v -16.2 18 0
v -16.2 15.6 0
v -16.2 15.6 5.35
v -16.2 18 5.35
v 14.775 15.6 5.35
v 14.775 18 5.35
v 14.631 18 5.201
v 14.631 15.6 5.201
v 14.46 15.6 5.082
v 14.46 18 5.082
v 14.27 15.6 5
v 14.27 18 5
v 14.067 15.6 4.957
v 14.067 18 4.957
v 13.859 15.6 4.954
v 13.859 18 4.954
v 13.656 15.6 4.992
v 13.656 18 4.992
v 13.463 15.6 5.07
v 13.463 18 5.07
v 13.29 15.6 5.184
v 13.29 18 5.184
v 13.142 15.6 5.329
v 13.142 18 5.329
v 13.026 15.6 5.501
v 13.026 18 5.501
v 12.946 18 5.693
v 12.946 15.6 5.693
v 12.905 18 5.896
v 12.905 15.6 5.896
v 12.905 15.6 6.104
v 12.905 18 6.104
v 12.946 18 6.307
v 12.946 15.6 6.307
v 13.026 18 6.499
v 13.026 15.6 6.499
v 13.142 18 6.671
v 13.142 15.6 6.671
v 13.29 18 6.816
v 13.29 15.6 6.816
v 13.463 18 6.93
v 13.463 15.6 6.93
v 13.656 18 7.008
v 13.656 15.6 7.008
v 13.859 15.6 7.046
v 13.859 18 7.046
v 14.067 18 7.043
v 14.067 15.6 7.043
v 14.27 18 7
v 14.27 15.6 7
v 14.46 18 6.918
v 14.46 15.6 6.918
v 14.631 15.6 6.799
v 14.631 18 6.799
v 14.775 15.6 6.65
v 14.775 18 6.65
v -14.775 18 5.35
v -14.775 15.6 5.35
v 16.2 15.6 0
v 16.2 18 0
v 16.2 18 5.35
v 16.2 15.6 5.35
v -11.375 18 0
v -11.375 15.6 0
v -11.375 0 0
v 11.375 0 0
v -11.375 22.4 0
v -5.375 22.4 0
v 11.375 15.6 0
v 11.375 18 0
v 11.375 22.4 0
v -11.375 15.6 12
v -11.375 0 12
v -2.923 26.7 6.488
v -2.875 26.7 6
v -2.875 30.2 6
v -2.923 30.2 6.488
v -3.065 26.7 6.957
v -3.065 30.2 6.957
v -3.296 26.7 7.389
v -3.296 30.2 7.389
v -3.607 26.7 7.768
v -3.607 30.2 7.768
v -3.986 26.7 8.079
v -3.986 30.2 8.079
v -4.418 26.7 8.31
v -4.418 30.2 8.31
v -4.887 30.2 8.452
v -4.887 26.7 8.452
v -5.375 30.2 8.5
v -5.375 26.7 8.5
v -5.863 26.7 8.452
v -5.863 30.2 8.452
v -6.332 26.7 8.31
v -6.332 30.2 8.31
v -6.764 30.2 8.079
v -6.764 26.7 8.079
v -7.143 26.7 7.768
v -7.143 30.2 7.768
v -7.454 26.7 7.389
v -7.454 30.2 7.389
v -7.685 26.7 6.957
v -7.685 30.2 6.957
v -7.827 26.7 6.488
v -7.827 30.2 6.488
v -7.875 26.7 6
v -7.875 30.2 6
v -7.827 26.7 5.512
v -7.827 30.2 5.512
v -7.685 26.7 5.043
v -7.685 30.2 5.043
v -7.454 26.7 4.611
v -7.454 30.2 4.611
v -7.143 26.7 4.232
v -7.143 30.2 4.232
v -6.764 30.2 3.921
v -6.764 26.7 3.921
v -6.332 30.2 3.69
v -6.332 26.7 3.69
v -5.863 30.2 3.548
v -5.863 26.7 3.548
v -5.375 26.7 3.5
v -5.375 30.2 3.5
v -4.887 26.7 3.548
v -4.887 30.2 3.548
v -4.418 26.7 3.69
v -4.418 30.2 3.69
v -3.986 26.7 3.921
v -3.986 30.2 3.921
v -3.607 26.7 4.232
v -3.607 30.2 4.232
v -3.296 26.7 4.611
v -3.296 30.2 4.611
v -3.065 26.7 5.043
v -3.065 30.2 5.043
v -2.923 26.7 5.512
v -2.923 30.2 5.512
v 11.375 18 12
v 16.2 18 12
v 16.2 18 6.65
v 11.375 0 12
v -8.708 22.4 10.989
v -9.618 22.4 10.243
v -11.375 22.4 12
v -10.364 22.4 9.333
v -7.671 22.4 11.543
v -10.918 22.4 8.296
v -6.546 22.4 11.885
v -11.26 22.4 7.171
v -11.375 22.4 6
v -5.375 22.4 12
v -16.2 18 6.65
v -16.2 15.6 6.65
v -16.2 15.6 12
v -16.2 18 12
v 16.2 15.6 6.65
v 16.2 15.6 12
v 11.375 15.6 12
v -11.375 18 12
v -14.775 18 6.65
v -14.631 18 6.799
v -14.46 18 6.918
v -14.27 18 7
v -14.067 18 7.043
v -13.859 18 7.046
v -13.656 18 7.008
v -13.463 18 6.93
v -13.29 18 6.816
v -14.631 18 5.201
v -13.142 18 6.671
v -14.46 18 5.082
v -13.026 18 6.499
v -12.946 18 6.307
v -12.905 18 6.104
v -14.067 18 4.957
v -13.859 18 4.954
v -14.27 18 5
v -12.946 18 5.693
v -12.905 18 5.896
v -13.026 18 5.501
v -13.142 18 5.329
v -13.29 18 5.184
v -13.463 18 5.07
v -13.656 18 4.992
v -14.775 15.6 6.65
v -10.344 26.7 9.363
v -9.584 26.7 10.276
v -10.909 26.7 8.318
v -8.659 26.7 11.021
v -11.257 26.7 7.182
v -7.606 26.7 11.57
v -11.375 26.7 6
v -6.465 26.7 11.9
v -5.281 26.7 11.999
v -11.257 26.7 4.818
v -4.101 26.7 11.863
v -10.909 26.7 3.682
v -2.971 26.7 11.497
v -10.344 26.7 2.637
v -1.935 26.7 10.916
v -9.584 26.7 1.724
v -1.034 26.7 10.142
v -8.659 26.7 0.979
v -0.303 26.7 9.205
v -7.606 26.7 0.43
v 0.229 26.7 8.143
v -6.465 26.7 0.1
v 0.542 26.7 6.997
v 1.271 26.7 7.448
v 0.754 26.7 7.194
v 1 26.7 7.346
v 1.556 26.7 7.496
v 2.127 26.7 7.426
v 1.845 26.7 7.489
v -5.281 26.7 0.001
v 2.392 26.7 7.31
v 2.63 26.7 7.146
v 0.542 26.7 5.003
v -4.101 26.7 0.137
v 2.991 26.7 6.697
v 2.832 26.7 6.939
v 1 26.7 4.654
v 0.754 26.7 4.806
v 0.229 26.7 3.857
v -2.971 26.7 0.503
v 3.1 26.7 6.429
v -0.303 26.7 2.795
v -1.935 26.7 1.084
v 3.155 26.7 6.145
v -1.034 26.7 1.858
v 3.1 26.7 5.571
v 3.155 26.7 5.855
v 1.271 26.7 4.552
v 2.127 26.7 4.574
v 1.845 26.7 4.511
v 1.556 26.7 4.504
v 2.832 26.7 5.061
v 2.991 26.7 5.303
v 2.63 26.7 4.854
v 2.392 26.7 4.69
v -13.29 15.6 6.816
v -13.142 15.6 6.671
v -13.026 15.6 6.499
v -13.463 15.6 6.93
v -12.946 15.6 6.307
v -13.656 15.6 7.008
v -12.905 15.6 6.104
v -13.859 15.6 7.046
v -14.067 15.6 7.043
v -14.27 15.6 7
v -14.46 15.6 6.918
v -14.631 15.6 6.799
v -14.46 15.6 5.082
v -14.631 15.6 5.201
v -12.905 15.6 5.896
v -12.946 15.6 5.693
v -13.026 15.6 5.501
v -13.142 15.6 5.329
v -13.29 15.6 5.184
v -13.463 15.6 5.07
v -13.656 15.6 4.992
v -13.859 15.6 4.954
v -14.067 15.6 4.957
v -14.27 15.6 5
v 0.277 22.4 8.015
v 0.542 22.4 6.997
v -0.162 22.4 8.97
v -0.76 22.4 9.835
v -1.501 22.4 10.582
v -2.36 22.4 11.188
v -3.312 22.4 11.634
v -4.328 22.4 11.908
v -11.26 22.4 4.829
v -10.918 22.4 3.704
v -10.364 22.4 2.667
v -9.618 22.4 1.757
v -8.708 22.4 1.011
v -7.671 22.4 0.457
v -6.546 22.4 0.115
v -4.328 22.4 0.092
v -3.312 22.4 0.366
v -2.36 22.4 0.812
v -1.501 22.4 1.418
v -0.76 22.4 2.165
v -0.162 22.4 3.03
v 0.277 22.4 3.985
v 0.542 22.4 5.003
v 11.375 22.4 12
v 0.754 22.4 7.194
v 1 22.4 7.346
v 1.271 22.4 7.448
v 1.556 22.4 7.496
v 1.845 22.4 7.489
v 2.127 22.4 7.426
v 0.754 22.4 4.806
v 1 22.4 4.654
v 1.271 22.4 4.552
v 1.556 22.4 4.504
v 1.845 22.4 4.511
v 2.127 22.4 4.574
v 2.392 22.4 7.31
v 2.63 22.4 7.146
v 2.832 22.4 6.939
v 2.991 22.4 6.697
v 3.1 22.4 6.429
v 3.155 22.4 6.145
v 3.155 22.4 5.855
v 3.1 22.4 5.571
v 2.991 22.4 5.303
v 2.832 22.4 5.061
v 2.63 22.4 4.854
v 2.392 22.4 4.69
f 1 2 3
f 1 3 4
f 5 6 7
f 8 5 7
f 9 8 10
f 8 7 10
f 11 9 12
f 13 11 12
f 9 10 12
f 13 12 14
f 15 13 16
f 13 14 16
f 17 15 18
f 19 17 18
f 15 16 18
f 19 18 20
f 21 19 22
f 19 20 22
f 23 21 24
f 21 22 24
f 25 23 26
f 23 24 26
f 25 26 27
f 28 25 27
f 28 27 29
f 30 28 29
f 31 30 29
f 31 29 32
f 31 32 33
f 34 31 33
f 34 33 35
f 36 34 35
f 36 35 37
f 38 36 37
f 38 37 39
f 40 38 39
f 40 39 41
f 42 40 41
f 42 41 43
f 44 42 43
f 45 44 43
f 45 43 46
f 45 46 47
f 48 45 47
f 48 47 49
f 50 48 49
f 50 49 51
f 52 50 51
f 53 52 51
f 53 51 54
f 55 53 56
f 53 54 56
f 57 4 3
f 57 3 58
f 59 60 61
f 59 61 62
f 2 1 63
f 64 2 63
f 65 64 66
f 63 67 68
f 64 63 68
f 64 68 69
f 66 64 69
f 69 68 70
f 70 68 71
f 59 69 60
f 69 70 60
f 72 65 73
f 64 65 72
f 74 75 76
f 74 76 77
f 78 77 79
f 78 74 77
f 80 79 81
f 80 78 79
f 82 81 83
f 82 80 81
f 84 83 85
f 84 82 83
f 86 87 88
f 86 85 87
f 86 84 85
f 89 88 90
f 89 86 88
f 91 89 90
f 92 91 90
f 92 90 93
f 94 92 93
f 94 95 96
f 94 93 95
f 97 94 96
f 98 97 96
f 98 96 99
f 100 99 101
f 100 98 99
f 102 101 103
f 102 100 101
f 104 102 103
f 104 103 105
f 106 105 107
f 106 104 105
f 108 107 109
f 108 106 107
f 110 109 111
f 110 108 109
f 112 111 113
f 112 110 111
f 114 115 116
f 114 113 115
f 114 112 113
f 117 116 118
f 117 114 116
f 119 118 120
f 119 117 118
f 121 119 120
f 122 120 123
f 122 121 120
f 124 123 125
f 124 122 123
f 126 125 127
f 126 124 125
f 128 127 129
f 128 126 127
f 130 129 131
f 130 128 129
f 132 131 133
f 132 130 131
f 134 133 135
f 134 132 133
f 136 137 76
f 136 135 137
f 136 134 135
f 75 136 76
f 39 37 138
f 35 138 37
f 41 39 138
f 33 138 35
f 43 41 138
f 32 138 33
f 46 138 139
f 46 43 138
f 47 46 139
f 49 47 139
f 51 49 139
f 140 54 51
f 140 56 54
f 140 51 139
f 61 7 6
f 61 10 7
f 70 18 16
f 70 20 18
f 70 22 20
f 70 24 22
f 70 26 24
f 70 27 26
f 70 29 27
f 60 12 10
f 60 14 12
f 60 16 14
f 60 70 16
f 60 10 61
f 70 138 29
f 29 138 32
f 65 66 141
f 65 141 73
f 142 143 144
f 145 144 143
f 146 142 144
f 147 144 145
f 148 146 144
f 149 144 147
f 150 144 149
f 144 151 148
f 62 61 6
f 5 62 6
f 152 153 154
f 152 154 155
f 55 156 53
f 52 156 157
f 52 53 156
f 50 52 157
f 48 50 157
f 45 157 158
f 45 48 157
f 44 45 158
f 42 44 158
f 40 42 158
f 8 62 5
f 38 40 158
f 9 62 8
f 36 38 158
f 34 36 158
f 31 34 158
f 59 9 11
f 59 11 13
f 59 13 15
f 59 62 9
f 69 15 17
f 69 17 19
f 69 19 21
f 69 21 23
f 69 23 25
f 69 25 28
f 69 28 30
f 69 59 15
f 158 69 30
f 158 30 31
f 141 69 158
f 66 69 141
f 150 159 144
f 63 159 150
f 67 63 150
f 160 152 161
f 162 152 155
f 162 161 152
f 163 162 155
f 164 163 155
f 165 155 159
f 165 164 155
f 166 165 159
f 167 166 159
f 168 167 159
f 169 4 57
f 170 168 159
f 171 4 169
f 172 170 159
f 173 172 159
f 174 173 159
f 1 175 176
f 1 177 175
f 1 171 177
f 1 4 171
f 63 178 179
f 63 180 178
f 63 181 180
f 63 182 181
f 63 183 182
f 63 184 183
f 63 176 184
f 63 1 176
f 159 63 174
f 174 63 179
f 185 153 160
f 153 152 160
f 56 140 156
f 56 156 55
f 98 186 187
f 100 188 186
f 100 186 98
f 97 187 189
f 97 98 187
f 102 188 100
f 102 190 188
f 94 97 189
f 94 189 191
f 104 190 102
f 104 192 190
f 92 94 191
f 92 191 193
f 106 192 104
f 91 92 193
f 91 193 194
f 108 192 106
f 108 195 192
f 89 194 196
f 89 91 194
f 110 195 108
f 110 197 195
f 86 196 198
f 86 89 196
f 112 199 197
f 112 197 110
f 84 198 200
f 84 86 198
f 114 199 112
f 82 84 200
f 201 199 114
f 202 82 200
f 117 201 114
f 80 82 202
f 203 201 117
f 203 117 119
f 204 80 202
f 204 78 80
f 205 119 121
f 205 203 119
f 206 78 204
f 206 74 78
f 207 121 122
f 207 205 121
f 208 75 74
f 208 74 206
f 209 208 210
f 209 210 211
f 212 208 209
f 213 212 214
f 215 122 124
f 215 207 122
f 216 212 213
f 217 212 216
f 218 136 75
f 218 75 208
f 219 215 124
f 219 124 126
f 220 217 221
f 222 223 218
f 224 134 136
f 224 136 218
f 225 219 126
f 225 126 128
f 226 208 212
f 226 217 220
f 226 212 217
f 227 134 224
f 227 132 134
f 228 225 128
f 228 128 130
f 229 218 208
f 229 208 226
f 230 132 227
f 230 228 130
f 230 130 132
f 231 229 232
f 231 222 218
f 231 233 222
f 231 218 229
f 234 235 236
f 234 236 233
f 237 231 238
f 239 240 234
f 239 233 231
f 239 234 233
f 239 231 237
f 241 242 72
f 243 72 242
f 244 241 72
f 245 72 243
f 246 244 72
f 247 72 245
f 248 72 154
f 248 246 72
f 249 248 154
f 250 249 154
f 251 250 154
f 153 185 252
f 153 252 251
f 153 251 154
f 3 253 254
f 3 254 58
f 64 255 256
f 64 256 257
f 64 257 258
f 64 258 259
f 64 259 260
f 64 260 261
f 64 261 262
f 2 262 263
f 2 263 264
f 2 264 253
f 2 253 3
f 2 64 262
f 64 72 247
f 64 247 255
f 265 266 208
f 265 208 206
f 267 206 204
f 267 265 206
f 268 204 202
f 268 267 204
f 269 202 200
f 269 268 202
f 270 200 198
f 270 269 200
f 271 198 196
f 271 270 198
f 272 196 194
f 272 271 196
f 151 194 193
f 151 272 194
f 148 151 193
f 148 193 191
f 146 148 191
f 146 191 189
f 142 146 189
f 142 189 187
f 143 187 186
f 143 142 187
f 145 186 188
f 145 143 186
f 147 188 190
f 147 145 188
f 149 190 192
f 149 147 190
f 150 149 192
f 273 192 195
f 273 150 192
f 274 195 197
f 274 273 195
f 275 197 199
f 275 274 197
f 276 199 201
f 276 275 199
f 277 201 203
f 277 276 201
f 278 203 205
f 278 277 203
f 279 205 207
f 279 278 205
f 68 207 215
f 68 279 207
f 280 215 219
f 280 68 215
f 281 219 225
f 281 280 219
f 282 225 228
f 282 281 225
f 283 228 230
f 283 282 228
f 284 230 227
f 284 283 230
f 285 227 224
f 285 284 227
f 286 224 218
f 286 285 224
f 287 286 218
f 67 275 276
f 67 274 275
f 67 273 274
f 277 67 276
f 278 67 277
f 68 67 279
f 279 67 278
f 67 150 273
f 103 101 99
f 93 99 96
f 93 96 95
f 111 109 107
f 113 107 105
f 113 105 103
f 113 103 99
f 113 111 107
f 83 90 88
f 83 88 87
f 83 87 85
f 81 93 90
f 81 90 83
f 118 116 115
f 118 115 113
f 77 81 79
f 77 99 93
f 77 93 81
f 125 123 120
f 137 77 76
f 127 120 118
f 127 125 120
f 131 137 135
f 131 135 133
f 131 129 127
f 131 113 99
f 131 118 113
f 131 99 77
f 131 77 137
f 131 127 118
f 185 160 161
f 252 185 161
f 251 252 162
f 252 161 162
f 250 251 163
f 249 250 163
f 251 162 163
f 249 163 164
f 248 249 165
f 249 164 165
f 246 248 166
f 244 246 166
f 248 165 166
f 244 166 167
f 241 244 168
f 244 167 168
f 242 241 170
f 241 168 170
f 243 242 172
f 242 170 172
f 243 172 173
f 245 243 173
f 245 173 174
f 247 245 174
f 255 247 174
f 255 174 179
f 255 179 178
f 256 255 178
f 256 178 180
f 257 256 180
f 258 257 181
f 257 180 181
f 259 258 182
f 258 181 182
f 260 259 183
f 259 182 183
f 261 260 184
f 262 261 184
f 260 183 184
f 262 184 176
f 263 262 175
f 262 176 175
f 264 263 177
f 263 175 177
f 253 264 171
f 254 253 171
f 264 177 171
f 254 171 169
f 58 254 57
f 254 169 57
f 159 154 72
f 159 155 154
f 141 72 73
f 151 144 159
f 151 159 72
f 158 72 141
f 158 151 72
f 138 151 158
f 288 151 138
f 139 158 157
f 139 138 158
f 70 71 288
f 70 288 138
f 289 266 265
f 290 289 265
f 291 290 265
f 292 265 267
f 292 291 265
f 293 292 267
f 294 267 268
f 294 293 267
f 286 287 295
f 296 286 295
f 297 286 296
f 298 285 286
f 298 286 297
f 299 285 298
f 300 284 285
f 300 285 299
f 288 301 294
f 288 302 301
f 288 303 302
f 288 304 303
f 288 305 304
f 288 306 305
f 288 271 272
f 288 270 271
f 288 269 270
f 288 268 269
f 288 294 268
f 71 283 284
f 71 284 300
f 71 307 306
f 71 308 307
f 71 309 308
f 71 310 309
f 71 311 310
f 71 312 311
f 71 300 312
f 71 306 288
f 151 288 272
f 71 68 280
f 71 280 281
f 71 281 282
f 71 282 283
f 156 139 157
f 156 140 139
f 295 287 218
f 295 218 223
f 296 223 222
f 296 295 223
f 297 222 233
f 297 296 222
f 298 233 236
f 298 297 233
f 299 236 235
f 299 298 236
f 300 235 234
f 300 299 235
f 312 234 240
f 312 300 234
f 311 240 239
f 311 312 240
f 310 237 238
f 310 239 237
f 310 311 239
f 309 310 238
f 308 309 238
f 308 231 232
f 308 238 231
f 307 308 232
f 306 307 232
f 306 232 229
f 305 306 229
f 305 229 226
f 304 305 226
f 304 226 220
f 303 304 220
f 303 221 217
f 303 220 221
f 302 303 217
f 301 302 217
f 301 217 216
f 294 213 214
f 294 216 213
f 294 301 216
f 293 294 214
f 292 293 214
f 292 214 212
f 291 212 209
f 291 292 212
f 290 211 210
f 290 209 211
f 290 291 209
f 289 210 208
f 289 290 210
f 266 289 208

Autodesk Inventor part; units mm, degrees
ref_plane "YZ Plane" through (0, 0, 0) normal (1, 0, 0) x (0, 1, 0)
ref_plane "XZ Plane" through (0, 0, 0) normal (0, 1, 0) x (-1, 0, 0)
ref_plane "XY Plane" through (0, 0, 0) normal (0, 0, 1) x (1, 0, 0)
sketch "Sketch1" plane through (0, 0, 0) normal (0, 0, 1) x (1, 0, 0)
  line L0 (0, 0) -> (-11.375, 0)
  line L1 (-11.375, 0) -> (-11.375, 15.6)
  line L2 (-11.375, 15.6) -> (-16.2, 15.6)
  line L3 (-16.2, 15.6) -> (-16.2, 18)
  line L4 (-16.2, 18) -> (-11.375, 18)
  line L5 (-11.375, 18) -> (-11.375, 22.4)
  line L6 (-11.375, 22.4) -> (11.375, 22.4)
  line L7 (11.375, 22.4) -> (11.375, 18)
  line L8 (11.375, 18) -> (16.2, 18)
  line L9 (16.2, 18) -> (16.2, 15.6)
  line L10 (16.2, 15.6) -> (11.375, 15.6)
  line L11 (11.375, 15.6) -> (11.375, 0)
  line L12 (11.375, 0) -> (0, 0)
  dimension "d0" = 11.375
  dimension "d1" = 15.6
  dimension "d2" = 4.825
  dimension "d3" = 2.4
  dimension "d4" = 4.4
  dimension "d5" = 22.75
  dimension "d7" = 4.825
  dimension "d8" = 2.4
  dimension "d9" = 18
extrude "Extrusion1" add sketch "Sketch1" along normal blind 12
sketch "Sketch2" plane through (-11.375, 22.4, 0) normal (0, 1, 0) x (1, 0, 0)
  line L0 (0, -12) -> (22.75, -12) projected
  line L1 (0, 0) -> (22.75, 0) projected
  line L2 (0, 0) -> (0, -12) projected
  arc A0 (11.9166, -5.003) -> (11.9166, -6.997) centre (6, -6) ccw
  arc A1 (11.9166, -6.997) -> (11.9166, -5.003) centre (13.0373, -6) ccw
  point P0 (11.375, 0)
  dimension "d13" = 3
extrude "Extrusion2" add sketch "Sketch2" along normal blind 4.3 contours A0 A1
sketch "Sketch3" plane through (-11.375, 26.7, 0) normal (0, 1, 0) x (1, 0, 0)
  arc A0 (11.9166, -5.003) -> (11.9166, -6.997) centre (6, -6) ccw projected
  circle A1 centre (6, -6) radius 2.5
  point P0 (11.375, 0)
  dimension "d16" = 5
extrude "Extrusion3" add sketch "Sketch3" along normal blind 3.5
sketch "Sketch4" plane through (-16.2, 18, 0) normal (0, 1, 0) x (1, 0, 0)
  line L0 (0, 0) -> (0, -12) projected
  line L1 (27.575, -12) -> (32.4, -12) projected
  line L2 (32.4, 0) -> (32.4, -12) projected
  line L3 (27.575, 0) -> (32.4, 0) projected
  line L4 (27.575, 0) -> (27.575, -12) projected
  arc A0 (1.4254, -6.65) -> (1.4254, -5.35) centre (2.25, -6) ccw
  arc A1 (30.9746, -5.35) -> (30.9746, -6.65) centre (30.15, -6) ccw
  line L5 (0, 0) -> (0, -12) construction
  line L6 (0, -6) -> (32.4, -6) construction
  line L7 (32.4, 0) -> (32.4, -12) construction
  line L8 (0, -5.35) -> (1.4254, -5.35)
  line L9 (0, -6.65) -> (1.4254, -6.65)
  line L10 (32.4, -5.35) -> (30.9746, -5.35)
  line L11 (32.4, -6.65) -> (30.9746, -6.65)
  line L12 (0, -5.35) -> (-0.3532, -5.35)
  line L13 (-0.3532, -5.35) -> (-0.3532, -6.65)
  line L14 (-0.3532, -6.65) -> (0, -6.65)
  line L15 (32.4, -5.35) -> (32.7834, -5.35)
  line L16 (32.7834, -5.35) -> (32.7834, -6.65)
  line L17 (32.7834, -6.65) -> (32.4, -6.65)
  point P0 (16.2, 0)
  dimension "d19" = 2.1
  dimension "d20" = 2.1
  dimension "d21" = 27.9
  dimension "d22" = 2.25
  dimension "d23" = 1.3
  dimension "d25" = 0.65
  dimension "d26" = 1.3
  dimension "d27" = 0.65
extrude "Extrusion4" cut sketch "Sketch4" against normal up to next contours L8 A0 L9 L0 | L0 L14 L13 L12 | L11 A1 L10 L2 | L2 L15 L16 L17
properties part number "MicroServo_Motor"
